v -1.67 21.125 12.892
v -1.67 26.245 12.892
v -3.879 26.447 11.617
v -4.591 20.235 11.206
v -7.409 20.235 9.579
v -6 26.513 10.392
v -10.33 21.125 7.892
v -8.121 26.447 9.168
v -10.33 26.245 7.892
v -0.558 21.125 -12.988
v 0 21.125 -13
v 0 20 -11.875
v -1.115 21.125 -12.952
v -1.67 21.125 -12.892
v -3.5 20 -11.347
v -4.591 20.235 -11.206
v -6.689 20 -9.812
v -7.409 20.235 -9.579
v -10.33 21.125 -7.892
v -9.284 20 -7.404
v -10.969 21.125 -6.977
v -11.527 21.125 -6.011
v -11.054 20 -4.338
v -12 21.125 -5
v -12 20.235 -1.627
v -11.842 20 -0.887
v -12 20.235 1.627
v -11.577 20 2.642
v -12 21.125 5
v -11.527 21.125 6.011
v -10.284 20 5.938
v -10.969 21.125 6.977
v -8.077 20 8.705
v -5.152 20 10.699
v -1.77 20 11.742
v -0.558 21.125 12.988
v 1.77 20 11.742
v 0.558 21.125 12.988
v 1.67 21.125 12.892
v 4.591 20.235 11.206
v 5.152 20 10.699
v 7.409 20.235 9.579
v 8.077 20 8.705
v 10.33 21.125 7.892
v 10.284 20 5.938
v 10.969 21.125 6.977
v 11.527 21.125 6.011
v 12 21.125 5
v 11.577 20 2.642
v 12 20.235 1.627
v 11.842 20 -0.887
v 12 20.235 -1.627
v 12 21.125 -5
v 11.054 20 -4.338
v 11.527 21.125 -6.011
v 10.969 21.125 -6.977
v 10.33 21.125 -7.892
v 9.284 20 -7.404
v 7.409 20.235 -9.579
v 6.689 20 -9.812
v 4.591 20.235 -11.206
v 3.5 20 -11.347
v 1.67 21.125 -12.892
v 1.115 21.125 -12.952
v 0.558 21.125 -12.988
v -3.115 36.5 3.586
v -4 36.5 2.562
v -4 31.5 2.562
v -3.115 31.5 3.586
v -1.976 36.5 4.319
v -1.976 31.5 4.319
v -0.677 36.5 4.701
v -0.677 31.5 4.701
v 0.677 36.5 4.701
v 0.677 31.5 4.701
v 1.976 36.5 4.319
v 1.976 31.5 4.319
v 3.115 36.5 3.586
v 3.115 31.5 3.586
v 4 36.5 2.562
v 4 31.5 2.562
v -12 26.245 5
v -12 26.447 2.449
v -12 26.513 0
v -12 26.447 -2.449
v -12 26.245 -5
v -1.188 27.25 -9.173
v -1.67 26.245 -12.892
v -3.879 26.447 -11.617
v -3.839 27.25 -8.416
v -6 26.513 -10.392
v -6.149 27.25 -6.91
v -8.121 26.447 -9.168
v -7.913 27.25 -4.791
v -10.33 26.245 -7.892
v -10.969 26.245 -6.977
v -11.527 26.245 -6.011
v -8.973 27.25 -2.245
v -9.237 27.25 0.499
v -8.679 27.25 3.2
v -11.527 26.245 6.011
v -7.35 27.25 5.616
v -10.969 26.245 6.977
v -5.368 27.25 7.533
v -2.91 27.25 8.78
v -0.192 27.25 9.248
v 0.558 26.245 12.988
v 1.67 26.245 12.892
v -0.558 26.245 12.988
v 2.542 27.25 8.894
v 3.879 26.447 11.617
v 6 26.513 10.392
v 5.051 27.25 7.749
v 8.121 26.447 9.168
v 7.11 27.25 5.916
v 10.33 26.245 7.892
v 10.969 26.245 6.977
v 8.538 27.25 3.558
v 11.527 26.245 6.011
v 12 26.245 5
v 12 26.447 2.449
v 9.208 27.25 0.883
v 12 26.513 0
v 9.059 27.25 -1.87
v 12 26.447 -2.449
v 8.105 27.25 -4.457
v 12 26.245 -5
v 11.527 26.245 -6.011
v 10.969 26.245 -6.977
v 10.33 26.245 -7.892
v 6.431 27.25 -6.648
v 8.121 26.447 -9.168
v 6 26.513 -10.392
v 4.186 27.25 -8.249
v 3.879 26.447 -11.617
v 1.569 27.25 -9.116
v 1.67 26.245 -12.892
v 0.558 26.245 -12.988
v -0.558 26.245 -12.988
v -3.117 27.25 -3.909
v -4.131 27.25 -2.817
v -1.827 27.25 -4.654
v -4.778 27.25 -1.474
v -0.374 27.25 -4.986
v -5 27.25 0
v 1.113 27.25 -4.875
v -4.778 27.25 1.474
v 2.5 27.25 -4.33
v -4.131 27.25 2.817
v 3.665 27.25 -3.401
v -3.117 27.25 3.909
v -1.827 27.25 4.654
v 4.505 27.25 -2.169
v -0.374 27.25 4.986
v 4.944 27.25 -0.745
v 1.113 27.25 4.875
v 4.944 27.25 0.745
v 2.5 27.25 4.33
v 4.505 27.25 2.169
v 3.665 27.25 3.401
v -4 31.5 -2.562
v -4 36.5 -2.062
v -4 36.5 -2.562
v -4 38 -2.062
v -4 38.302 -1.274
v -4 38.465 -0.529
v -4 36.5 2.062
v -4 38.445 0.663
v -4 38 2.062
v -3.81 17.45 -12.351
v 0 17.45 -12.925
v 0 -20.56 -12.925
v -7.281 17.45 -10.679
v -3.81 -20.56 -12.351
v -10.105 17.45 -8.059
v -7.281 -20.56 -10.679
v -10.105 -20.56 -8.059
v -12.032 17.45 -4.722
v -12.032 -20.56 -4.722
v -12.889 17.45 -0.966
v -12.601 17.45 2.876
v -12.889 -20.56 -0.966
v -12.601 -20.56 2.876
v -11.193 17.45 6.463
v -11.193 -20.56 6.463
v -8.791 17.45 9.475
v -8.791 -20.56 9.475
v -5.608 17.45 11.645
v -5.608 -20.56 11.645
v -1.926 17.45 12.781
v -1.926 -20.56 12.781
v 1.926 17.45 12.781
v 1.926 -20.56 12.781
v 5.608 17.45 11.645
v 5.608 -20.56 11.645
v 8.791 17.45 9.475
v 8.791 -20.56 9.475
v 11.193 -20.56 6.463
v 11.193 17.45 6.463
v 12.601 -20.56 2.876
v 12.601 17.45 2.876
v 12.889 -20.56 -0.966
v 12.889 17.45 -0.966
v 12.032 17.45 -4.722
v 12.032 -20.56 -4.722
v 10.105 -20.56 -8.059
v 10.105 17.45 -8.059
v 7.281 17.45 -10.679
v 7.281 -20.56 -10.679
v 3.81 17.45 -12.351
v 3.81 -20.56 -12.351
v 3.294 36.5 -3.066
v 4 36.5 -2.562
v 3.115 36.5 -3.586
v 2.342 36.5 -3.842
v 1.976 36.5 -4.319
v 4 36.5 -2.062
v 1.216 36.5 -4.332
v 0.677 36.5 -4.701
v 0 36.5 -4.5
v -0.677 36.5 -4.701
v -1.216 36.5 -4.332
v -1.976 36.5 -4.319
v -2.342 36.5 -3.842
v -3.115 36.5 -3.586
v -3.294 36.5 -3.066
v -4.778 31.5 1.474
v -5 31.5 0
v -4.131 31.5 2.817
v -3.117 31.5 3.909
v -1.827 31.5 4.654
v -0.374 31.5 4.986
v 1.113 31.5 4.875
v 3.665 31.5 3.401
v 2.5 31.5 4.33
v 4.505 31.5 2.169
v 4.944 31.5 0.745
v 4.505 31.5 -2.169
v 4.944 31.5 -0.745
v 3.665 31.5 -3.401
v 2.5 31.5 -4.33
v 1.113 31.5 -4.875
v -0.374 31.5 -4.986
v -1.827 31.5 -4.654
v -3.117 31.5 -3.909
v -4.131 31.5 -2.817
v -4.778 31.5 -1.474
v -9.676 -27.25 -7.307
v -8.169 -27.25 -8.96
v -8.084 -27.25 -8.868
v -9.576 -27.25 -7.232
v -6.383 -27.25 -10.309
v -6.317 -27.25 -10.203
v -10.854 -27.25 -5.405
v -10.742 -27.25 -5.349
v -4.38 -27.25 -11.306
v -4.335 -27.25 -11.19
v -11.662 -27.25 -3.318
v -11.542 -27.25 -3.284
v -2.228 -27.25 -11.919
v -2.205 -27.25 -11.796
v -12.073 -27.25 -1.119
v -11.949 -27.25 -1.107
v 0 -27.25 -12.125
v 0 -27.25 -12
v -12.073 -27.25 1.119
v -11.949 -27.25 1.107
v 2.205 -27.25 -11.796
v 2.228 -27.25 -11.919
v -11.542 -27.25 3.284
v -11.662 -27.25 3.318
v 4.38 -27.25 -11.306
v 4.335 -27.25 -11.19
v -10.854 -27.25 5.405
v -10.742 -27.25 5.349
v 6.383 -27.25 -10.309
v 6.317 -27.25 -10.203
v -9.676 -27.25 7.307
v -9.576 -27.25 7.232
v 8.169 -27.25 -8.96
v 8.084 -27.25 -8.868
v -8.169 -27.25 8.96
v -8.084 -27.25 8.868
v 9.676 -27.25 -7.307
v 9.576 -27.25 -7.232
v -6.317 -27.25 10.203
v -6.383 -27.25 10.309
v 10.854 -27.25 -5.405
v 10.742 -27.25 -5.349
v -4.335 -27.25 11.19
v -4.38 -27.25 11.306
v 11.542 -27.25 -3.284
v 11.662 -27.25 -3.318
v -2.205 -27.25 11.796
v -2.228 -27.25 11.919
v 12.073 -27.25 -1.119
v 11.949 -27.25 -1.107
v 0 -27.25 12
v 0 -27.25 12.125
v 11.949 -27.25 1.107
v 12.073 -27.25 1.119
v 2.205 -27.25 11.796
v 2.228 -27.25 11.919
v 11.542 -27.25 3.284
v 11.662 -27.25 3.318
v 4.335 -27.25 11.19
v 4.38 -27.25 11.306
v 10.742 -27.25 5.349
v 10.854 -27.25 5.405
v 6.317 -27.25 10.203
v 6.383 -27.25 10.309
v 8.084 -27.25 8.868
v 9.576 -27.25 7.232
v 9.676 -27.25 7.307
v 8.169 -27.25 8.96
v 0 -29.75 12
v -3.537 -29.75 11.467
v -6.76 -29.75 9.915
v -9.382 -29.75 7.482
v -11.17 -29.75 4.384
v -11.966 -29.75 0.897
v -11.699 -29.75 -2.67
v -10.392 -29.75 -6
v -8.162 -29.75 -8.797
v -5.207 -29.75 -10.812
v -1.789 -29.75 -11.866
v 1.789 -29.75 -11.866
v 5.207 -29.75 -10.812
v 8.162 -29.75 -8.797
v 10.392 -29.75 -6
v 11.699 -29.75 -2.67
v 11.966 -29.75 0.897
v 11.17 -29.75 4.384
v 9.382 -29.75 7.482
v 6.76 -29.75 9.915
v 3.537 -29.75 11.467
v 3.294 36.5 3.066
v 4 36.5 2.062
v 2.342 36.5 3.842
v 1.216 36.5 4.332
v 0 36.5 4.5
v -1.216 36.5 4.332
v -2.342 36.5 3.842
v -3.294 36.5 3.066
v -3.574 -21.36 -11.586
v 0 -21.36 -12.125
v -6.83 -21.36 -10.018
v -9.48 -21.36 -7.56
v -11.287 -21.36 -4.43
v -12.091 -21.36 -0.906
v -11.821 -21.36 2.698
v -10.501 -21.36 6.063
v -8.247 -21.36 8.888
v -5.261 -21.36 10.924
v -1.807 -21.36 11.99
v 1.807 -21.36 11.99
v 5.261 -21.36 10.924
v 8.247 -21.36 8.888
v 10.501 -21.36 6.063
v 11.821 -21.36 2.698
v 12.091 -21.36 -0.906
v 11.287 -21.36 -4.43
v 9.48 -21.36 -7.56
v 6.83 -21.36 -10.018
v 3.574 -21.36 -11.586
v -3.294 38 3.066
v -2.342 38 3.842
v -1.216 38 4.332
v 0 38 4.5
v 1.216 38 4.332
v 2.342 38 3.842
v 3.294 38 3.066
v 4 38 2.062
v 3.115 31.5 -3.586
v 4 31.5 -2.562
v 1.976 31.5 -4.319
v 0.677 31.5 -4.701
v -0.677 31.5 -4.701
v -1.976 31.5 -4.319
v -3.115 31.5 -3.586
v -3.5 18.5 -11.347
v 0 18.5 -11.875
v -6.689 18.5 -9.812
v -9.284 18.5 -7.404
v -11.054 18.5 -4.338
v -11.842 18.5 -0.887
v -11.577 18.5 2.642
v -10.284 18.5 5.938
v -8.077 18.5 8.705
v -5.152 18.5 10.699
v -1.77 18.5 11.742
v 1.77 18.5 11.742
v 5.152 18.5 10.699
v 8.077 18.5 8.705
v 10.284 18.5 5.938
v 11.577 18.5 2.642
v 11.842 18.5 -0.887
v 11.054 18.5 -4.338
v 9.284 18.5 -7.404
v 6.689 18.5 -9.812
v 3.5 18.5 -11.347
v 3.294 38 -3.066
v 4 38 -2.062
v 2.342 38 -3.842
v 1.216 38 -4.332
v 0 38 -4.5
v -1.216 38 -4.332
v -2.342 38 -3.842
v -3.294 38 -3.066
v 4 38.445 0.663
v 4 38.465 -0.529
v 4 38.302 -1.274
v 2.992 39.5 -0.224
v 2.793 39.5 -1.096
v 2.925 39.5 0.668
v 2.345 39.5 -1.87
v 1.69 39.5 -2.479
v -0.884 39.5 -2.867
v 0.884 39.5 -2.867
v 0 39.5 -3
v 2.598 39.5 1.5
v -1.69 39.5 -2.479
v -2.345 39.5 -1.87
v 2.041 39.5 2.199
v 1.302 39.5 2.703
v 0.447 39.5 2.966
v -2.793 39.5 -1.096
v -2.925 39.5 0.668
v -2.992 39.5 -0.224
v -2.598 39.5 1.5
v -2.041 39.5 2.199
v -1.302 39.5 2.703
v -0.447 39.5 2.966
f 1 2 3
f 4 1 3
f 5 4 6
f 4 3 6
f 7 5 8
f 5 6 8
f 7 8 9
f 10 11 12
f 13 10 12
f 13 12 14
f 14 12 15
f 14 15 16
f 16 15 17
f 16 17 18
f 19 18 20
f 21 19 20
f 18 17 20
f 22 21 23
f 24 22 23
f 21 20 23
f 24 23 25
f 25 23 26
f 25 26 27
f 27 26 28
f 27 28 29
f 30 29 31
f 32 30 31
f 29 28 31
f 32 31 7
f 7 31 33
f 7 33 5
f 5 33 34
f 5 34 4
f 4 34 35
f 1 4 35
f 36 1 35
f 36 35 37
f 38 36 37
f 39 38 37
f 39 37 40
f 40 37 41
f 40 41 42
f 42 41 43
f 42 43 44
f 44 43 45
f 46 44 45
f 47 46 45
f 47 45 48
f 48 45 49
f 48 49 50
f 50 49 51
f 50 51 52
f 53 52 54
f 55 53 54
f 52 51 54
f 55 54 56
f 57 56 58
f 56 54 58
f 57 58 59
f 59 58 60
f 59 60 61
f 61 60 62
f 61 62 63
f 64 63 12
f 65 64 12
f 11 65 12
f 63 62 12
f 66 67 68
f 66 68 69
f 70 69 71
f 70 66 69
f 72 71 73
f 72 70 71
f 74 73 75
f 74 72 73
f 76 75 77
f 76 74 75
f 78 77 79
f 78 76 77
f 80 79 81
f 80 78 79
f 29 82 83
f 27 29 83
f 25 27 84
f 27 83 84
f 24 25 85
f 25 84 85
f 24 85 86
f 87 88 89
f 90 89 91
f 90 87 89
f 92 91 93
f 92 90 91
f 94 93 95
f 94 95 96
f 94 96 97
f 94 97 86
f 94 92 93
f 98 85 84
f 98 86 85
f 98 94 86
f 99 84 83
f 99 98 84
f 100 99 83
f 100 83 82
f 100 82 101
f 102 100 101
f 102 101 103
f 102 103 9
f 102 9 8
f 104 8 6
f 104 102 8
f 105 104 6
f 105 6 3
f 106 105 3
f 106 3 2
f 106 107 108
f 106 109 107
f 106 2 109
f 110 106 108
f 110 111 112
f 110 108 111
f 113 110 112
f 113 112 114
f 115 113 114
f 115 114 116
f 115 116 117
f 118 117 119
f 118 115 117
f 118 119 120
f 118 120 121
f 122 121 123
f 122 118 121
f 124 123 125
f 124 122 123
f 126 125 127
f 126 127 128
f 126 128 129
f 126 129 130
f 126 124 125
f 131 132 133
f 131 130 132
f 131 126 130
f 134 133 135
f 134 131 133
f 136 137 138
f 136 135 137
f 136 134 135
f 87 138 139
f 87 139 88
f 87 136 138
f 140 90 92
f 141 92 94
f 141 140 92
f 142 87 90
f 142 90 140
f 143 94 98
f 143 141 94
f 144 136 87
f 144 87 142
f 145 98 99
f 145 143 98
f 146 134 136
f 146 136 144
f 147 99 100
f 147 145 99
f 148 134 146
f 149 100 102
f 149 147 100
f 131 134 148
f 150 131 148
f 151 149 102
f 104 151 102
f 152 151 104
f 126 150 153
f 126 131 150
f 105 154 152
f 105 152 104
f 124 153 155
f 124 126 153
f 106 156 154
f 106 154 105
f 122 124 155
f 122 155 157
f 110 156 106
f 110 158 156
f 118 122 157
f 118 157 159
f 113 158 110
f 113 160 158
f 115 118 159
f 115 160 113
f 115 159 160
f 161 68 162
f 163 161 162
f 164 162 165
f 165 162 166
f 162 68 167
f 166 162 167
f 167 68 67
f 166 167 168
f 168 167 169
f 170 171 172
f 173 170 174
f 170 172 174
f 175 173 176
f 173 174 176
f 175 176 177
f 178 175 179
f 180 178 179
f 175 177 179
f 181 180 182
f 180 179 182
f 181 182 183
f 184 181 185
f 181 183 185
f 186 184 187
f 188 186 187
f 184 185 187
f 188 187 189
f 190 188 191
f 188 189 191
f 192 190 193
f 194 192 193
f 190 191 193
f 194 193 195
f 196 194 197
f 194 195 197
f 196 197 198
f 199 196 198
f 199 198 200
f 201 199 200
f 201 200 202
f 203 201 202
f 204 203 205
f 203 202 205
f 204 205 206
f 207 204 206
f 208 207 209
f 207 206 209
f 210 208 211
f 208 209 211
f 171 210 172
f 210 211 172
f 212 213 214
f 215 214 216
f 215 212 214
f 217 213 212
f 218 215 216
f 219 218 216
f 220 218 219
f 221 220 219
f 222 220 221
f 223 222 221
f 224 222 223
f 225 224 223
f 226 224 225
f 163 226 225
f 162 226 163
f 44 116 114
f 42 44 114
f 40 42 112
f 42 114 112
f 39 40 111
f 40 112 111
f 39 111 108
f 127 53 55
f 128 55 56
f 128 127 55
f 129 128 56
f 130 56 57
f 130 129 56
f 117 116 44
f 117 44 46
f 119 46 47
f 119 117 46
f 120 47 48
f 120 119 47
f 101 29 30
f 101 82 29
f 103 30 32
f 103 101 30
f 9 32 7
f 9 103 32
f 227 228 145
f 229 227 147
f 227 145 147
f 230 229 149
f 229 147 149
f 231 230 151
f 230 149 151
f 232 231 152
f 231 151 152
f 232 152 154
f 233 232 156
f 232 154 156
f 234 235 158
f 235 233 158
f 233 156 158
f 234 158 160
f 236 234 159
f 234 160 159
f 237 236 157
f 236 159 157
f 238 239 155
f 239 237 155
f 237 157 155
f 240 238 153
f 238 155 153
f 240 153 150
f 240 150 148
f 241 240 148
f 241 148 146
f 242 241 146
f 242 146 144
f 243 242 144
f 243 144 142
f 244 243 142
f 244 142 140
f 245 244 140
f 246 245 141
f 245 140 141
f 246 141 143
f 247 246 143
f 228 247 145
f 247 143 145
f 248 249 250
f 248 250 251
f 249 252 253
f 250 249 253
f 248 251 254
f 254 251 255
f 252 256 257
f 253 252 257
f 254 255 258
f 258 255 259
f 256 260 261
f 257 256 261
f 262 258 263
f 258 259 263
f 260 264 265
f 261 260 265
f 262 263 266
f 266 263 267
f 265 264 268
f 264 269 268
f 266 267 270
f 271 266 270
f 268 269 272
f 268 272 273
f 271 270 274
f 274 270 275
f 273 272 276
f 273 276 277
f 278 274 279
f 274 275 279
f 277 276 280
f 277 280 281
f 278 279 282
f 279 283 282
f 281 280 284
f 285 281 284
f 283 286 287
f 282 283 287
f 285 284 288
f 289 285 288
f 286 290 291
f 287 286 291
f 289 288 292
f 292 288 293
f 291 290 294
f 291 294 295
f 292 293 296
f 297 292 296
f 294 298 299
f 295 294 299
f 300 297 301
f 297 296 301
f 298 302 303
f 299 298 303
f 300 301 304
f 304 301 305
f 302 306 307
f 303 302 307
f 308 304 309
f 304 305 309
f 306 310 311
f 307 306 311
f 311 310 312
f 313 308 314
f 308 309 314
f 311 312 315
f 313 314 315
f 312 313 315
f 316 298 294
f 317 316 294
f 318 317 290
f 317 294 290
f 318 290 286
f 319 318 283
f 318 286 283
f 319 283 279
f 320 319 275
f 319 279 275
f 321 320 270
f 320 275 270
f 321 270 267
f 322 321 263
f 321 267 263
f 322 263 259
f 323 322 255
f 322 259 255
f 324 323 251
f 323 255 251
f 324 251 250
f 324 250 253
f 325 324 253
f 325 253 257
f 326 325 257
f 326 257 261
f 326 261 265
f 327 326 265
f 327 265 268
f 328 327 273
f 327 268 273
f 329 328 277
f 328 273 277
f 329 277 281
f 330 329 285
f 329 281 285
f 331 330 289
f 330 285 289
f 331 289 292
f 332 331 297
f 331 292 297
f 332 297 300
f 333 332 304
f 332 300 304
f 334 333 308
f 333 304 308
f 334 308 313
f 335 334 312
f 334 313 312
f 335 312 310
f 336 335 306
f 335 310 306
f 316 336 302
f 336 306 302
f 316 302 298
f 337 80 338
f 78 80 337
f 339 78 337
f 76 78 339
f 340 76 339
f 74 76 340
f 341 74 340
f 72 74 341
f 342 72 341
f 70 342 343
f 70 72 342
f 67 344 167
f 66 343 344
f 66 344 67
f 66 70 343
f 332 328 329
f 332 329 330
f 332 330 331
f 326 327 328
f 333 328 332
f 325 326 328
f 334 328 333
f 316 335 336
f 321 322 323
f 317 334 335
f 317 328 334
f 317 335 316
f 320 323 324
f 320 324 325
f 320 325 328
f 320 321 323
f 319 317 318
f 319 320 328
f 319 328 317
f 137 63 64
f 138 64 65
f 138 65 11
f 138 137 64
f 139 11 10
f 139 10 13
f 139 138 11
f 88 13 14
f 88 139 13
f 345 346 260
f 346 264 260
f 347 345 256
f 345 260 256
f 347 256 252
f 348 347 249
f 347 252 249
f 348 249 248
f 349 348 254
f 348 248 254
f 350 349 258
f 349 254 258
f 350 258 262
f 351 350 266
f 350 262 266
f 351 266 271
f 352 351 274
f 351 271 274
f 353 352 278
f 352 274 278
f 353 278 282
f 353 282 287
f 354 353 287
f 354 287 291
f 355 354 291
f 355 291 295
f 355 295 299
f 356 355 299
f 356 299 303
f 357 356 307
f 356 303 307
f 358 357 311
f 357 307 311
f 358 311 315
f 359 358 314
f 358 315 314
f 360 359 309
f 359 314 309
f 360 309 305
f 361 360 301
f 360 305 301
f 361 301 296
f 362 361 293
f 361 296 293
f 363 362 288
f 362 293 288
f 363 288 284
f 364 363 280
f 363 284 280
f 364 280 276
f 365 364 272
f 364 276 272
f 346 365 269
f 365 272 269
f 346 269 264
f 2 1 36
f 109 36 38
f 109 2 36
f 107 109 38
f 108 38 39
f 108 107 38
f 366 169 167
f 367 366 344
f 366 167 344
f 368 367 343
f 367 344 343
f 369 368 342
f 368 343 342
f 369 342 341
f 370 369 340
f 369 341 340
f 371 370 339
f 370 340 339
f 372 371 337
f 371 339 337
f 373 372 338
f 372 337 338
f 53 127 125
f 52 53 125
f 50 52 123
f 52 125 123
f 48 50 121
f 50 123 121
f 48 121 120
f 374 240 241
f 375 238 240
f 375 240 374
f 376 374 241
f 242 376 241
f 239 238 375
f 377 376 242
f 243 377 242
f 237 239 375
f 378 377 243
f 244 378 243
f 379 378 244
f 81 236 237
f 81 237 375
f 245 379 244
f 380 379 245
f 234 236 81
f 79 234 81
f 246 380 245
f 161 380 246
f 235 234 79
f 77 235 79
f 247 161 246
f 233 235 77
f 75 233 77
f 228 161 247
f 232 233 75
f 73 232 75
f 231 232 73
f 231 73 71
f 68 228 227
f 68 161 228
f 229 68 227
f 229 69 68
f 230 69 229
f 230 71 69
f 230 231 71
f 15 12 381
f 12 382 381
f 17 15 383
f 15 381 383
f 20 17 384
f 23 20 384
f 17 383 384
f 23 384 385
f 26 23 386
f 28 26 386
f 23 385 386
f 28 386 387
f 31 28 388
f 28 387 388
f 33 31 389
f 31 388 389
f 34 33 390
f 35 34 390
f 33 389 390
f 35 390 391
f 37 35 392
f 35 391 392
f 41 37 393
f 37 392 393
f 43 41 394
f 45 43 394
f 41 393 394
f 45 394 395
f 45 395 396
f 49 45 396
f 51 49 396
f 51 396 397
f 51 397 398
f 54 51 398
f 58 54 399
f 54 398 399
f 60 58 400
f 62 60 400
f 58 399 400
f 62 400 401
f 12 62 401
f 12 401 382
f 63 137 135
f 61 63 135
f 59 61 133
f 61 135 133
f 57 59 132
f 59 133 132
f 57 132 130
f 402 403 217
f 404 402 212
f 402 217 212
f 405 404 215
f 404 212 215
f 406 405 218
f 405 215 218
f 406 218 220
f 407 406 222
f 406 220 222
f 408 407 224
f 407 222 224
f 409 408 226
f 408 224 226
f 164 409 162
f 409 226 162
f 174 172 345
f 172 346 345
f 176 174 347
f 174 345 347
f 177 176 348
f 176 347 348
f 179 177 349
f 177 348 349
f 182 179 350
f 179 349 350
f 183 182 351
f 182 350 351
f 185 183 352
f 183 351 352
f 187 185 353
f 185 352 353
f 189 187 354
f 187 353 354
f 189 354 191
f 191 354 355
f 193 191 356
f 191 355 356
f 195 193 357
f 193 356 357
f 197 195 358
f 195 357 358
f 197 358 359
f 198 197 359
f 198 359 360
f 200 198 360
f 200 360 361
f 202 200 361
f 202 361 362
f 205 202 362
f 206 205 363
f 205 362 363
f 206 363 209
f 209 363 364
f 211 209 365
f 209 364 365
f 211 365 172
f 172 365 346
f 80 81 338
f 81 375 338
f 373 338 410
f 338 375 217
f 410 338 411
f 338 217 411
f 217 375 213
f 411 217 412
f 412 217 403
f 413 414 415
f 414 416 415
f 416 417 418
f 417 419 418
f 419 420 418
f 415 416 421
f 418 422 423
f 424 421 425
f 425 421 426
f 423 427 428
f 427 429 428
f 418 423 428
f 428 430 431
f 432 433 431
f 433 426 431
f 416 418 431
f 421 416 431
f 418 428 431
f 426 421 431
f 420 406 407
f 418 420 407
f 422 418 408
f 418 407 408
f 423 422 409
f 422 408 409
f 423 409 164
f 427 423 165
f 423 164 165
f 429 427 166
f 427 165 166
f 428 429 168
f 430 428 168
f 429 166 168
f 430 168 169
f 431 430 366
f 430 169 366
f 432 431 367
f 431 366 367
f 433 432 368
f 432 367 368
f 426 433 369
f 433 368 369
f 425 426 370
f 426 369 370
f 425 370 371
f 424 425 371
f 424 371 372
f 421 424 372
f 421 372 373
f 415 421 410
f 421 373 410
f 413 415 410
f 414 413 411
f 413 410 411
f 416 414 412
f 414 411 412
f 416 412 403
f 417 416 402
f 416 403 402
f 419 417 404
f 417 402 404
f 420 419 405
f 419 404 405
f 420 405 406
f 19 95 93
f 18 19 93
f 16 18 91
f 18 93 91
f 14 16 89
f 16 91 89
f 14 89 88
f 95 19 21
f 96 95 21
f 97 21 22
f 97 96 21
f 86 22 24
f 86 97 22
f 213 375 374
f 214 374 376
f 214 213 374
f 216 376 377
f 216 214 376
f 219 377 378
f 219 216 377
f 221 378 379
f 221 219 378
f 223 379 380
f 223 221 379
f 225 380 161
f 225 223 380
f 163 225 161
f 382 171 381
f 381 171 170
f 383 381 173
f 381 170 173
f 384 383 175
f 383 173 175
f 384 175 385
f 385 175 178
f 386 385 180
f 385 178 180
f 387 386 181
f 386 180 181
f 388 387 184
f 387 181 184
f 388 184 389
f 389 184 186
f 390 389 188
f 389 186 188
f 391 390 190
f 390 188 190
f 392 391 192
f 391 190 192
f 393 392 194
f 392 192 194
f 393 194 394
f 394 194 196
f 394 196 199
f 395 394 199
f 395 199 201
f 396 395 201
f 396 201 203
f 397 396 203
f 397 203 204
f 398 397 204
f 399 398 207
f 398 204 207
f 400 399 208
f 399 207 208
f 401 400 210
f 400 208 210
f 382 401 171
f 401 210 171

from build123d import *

# Parameters (mm, degrees)
SKETCH1_R          = 13
STOCK_DEPTH        = 27.25
HEX_HEAD_DEPTH     = 8.5
SKETCH5_R          = 12
RETAINER_DEPTH     = 2.5
SKETCH9_W          = 0.724432229
SKETCH9_H          = 3.174333178
SKETCH9_W_2        = 8
SKETCH9_H_2        = 0.600364256
SKETCH9_W_3        = 0.732916959
CUT_EXTRUDE3_DEPTH = 13.475
SKETCH10_R         = 5
EXTRUDE4_DEPTH     = 9.25
SKETCH13_R         = 5
SKETCH13_R_2       = 4.75
CUT_EXTRUDE4_DEPTH = 5
SKETCH14_W         = 1
SKETCH14_H         = 5
CUT_EXTRUDE5_DEPTH = 13.475


with BuildPart() as part:
    # Sketch1 → STOCK (new body, symmetric)
    with BuildSketch(Plane(origin=(0, 0, 0), x_dir=(1, 0, 0), z_dir=(0, 1, 0))):
        with Locations(Location((0, 0, 0), (0, 0, 270))):  # turned: the seam where the file's is
            Circle(SKETCH1_R)
    extrude(amount=STOCK_DEPTH, both=True)

    # Sketch2 → HEX_HEAD (cut)
    with BuildSketch(Plane(origin=(0, 27.25, 0), x_dir=(1, 0, 0), z_dir=(0, 1, 0))):
        with BuildLine():
            ThreePointArc((10.330127019, 7.892304845), (6.5, 11.258330249), (1.669872981, 12.892304845))
            Line((1.669872981, 12.892304845), (10.330127019, 7.892304845))
        make_face()
        with BuildLine():
            Line((-10.330127019, 7.892304845), (-1.669872981, 12.892304845))
            ThreePointArc((-1.669872981, 12.892304845), (-6.5, 11.258330249), (-10.330127019, 7.892304845))
        make_face()
        with BuildLine():
            Line((12, 5), (12, -5))
            ThreePointArc((12, -5), (13, 0), (12, 5))
        make_face()
        with BuildLine():
            Line((-12, -5), (-12, 5))
            ThreePointArc((-12, 5), (-13, 0), (-12, -5))
        make_face()
        with BuildLine():
            Line((10.330127019, -7.892304845), (1.669872981, -12.892304845))
            ThreePointArc((1.669872981, -12.892304845), (6.5, -11.258330249), (10.330127019, -7.892304845))
        make_face()
        with BuildLine():
            Line((-1.669872981, -12.892304845), (-10.330127019, -7.892304845))
            ThreePointArc((-10.330127019, -7.892304845), (-6.5, -11.258330249), (-1.669872981, -12.892304845))
        make_face()
    extrude(amount=-HEX_HEAD_DEPTH, mode=Mode.SUBTRACT)

    # Sketch3 → CROWN (revolve, cut)
    with BuildSketch(Plane.XY, mode=Mode.PRIVATE) as crown_sk:
        Polygon((9.25, 27.25), (13, 27.25), (13, 26.245190528), align=None)
    revolve(crown_sk.sketch.rotate(Axis((0, 0, 0), (0, 1, 0)), 97.380135052), axis=Axis((0, 0, 0), (0, 1, 0)), mode=Mode.SUBTRACT)  # turned: the seam where the file's is

    # Sketch4 → OD_PROFILE (revolve, cut)
    with BuildSketch(Plane.XY, mode=Mode.PRIVATE) as od_profile_sk:
        Polygon((17.017319953, -27.25), (17.017319953, 25.142319953), (11.875, 20), (11.875, 18.5), (12.925, 17.45), (12.925, -20.56), (12.125, -21.36), (12.125, -27.25), align=None)
    revolve(od_profile_sk.sketch.rotate(Axis((0, -29.172938247, 0), (0, 1, 0)), 90), axis=Axis((0, -29.172938247, 0), (0, 1, 0)), mode=Mode.SUBTRACT)  # turned: the seam where the file's is

    # Sketch5 → RETAINER (add)
    with BuildSketch(Plane.XZ.offset(27.25)):
        with Locations(Location((0, 0, 0), (0, 0, 90))):  # turned: the seam where the file's is
            Circle(SKETCH5_R)
    extrude(amount=RETAINER_DEPTH)



with BuildPart() as body_2:
    # Sketch8 → Revolve1 (revolve)
    with BuildSketch(Plane.XY, mode=Mode.PRIVATE) as revolve1_sk:
        Polygon((0, 39.5), (3, 39.5), (4.5, 38), (4.5, 36.5), (0, 36.5), align=None)
    revolve(revolve1_sk.sketch.rotate(Axis((0, 0, 0), (0, 1, 0)), 90), axis=Axis((0, 0, 0), (0, 1, 0)))  # turned: the seam where the file's is

    # Sketch9 → Cut-Extrude3 (cut, symmetric)
    with BuildSketch(Plane.XY):
        with Locations((4.362216115, 38.087166589)):
            Rectangle(SKETCH9_W, SKETCH9_H)
        with Locations((0, 36.199817872)):
            Rectangle(SKETCH9_W_2, SKETCH9_H_2)
        with Locations((-4.36645848, 38.087166589)):
            Rectangle(SKETCH9_W_3, SKETCH9_H)
    extrude(amount=CUT_EXTRUDE3_DEPTH, both=True, mode=Mode.SUBTRACT)


with BuildPart() as part_1:
    add(part.part)

    add(body_2.part)  # Extrude4 merges body 2
    # Sketch10 → Extrude4 (add)
    with BuildSketch(Plane(origin=(0, 27.25, 0), x_dir=(1, 0, 0), z_dir=(0, 1, 0))):
        with Locations(Location((0, 0, 0), (0, 0, 180))):  # turned: the seam where the file's is
            Circle(SKETCH10_R)
    extrude(amount=EXTRUDE4_DEPTH)

    # Sketch13 → Cut-Extrude4 (cut)
    with BuildSketch(Plane(origin=(0, 36.5, 0), x_dir=(1, 0, 0), z_dir=(0, 1, 0))):
        with Locations(Location((0, 0, 0), (0, 0, 180))):  # turned: the seam where the file's is
            Circle(SKETCH13_R)
        with Locations(Location((0, 0, 0), (0, 0, 180))):  # turned: the seam where the file's is
            Circle(SKETCH13_R_2, mode=Mode.SUBTRACT)
    extrude(amount=-CUT_EXTRUDE4_DEPTH, mode=Mode.SUBTRACT)

    # Sketch14 → Cut-Extrude5 (cut, symmetric)
    with BuildSketch(Plane.XY):
        with Locations((4.5, 34)):
            Rectangle(SKETCH14_W, SKETCH14_H)
        with Locations((-4.5, 34)):
            Rectangle(SKETCH14_W, SKETCH14_H)
    extrude(amount=CUT_EXTRUDE5_DEPTH, both=True, mode=Mode.SUBTRACT)


solid = part_1.part
